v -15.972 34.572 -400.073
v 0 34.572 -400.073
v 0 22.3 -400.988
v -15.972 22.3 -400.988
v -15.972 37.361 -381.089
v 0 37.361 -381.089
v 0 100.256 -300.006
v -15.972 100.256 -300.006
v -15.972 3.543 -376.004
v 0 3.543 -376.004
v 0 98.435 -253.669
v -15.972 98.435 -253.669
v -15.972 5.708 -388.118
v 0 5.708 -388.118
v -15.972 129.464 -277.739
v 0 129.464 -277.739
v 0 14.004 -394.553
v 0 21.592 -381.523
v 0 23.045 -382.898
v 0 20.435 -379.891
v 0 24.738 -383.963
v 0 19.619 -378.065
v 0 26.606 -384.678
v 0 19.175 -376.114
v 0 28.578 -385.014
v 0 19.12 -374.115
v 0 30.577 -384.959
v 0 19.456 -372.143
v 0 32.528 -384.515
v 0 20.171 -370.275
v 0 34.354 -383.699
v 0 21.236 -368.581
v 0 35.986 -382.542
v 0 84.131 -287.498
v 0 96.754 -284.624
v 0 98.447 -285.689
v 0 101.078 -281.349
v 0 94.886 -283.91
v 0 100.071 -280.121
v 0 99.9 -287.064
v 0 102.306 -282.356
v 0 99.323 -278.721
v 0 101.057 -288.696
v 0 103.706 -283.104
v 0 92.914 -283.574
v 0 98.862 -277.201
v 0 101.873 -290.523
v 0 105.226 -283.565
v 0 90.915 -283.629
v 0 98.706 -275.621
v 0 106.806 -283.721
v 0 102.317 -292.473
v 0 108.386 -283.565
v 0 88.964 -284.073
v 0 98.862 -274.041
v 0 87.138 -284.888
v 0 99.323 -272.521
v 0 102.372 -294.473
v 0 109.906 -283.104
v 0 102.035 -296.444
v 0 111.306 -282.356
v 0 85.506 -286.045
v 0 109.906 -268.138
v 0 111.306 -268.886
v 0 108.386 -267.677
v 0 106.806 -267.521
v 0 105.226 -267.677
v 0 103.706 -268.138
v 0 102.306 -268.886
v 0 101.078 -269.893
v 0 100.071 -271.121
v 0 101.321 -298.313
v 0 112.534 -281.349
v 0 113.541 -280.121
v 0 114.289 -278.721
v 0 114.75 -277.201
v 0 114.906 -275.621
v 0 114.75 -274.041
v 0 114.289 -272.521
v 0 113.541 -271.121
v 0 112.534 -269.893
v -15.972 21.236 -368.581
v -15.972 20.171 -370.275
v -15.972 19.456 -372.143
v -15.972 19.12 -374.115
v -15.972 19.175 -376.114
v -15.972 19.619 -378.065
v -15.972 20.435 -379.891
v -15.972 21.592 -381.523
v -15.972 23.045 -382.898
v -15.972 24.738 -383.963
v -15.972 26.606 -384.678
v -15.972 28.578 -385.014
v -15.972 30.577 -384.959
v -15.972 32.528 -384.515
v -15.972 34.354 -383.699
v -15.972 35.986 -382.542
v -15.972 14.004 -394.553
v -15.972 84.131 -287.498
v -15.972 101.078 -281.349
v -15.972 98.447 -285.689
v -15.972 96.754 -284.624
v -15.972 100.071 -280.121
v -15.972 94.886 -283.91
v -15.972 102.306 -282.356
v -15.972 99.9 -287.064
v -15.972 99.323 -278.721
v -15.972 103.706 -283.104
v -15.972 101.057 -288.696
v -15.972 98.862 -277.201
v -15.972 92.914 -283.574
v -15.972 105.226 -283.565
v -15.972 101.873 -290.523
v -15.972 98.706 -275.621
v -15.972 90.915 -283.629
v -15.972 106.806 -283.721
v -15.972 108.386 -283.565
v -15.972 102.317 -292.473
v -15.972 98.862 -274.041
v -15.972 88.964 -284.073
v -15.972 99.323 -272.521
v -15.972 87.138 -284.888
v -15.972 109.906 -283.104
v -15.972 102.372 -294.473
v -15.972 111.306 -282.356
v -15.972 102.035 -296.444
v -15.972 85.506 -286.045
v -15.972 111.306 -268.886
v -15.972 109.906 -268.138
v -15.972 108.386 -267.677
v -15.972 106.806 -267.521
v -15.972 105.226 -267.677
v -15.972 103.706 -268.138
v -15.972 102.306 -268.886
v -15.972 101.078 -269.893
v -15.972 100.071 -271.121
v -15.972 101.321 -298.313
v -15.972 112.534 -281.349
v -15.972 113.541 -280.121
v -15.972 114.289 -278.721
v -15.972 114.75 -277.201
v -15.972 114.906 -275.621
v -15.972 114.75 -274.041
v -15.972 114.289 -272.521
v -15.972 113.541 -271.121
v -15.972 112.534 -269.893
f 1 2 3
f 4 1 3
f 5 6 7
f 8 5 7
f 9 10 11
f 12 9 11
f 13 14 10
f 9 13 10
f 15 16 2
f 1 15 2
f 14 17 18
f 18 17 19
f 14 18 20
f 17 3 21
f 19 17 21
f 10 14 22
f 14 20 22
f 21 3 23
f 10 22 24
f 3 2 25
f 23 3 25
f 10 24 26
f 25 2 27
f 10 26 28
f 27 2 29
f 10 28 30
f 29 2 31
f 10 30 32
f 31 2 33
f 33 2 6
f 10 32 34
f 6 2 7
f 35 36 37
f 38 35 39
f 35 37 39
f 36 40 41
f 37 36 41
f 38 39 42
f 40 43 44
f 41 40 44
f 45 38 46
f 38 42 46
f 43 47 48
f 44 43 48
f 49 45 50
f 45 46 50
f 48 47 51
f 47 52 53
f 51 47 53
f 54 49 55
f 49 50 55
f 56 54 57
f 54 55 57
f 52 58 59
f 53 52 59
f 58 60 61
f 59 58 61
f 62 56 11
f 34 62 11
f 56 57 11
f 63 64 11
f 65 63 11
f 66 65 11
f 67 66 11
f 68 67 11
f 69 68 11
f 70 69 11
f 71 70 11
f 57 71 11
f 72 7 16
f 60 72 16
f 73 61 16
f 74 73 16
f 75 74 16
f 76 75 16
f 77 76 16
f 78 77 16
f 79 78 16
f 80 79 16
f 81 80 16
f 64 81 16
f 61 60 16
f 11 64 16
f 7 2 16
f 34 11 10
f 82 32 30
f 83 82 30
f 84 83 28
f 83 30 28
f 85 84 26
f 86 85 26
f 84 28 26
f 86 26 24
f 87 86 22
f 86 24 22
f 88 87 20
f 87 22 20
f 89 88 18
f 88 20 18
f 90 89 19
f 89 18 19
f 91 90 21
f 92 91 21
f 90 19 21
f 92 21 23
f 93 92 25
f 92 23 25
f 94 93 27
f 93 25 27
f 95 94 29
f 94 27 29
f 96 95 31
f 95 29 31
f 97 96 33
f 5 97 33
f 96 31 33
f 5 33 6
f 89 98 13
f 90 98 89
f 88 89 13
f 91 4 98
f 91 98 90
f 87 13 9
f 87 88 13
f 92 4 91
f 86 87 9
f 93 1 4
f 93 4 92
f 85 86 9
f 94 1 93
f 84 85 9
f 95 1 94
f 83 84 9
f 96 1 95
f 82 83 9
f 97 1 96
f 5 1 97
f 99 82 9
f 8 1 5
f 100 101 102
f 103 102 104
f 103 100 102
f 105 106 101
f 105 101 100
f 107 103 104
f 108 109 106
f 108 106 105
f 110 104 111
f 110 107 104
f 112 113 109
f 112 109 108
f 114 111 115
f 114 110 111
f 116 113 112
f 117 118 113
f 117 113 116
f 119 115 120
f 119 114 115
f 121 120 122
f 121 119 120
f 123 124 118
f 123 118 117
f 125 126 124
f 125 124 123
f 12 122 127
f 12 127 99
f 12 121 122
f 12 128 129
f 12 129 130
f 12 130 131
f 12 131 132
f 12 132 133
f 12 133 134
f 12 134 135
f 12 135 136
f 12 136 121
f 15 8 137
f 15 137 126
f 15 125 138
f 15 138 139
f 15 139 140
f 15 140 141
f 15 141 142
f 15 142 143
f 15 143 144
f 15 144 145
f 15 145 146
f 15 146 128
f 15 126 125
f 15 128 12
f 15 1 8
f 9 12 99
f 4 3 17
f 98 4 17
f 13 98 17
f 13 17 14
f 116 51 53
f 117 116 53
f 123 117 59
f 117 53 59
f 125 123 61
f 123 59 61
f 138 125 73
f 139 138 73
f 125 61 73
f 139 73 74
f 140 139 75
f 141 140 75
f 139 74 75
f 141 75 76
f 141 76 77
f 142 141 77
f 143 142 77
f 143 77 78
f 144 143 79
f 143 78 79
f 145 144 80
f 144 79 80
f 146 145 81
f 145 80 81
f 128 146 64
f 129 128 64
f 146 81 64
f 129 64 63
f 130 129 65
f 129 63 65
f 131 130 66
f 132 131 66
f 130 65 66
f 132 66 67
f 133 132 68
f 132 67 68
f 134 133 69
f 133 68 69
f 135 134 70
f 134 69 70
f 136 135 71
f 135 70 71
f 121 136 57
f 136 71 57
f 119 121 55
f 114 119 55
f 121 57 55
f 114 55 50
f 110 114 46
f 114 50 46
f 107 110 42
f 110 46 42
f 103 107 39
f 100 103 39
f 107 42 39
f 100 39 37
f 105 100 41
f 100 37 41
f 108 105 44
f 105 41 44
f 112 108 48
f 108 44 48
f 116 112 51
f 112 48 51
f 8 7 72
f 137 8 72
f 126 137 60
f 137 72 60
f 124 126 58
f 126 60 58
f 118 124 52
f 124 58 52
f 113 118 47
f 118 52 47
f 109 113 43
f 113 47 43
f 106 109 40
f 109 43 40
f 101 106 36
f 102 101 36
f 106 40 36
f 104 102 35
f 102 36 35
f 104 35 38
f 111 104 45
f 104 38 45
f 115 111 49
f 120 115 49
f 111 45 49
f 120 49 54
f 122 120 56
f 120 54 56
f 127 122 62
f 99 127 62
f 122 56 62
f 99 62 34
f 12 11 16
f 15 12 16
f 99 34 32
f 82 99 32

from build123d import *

# Parameters (mm, degrees)
SKETCH1_R           = 8.100025456
BOSS_EXTRUDE1_DEPTH = 15.972282


with BuildPart() as part:
    # Sketch1 → Boss-Extrude1 (new body)
    with BuildSketch(Plane(origin=(0, 0, 0), x_dir=(0, 0, -1), z_dir=(1, 0, 0))):
        Polygon((253.669292, 98.434652), (277.738586, 129.464308), (400.07286, 34.572448), (400.988022, 22.300438), (394.552932, 14.004036), (388.117588, 5.707888), (376.003566, 3.542538), align=None)
        with Locations((275.620988, 106.805984)):
            Circle(SKETCH1_R, mode=Mode.SUBTRACT)
        with BuildLine():
            Line((287.497774, 84.130896), (368.581432, 21.235924))
            ThreePointArc((368.581432, 21.235924), (382.898018562, 23.044528237), (381.089408, 37.361114))
            Line((381.089408, 37.361114), (300.00575, 100.255832))
            ThreePointArc((300.00575, 100.255832), (285.689367711, 98.447294823), (287.497774, 84.130896))
        make_face(mode=Mode.SUBTRACT)
    extrude(amount=-BOSS_EXTRUDE1_DEPTH)


solid = part.part
